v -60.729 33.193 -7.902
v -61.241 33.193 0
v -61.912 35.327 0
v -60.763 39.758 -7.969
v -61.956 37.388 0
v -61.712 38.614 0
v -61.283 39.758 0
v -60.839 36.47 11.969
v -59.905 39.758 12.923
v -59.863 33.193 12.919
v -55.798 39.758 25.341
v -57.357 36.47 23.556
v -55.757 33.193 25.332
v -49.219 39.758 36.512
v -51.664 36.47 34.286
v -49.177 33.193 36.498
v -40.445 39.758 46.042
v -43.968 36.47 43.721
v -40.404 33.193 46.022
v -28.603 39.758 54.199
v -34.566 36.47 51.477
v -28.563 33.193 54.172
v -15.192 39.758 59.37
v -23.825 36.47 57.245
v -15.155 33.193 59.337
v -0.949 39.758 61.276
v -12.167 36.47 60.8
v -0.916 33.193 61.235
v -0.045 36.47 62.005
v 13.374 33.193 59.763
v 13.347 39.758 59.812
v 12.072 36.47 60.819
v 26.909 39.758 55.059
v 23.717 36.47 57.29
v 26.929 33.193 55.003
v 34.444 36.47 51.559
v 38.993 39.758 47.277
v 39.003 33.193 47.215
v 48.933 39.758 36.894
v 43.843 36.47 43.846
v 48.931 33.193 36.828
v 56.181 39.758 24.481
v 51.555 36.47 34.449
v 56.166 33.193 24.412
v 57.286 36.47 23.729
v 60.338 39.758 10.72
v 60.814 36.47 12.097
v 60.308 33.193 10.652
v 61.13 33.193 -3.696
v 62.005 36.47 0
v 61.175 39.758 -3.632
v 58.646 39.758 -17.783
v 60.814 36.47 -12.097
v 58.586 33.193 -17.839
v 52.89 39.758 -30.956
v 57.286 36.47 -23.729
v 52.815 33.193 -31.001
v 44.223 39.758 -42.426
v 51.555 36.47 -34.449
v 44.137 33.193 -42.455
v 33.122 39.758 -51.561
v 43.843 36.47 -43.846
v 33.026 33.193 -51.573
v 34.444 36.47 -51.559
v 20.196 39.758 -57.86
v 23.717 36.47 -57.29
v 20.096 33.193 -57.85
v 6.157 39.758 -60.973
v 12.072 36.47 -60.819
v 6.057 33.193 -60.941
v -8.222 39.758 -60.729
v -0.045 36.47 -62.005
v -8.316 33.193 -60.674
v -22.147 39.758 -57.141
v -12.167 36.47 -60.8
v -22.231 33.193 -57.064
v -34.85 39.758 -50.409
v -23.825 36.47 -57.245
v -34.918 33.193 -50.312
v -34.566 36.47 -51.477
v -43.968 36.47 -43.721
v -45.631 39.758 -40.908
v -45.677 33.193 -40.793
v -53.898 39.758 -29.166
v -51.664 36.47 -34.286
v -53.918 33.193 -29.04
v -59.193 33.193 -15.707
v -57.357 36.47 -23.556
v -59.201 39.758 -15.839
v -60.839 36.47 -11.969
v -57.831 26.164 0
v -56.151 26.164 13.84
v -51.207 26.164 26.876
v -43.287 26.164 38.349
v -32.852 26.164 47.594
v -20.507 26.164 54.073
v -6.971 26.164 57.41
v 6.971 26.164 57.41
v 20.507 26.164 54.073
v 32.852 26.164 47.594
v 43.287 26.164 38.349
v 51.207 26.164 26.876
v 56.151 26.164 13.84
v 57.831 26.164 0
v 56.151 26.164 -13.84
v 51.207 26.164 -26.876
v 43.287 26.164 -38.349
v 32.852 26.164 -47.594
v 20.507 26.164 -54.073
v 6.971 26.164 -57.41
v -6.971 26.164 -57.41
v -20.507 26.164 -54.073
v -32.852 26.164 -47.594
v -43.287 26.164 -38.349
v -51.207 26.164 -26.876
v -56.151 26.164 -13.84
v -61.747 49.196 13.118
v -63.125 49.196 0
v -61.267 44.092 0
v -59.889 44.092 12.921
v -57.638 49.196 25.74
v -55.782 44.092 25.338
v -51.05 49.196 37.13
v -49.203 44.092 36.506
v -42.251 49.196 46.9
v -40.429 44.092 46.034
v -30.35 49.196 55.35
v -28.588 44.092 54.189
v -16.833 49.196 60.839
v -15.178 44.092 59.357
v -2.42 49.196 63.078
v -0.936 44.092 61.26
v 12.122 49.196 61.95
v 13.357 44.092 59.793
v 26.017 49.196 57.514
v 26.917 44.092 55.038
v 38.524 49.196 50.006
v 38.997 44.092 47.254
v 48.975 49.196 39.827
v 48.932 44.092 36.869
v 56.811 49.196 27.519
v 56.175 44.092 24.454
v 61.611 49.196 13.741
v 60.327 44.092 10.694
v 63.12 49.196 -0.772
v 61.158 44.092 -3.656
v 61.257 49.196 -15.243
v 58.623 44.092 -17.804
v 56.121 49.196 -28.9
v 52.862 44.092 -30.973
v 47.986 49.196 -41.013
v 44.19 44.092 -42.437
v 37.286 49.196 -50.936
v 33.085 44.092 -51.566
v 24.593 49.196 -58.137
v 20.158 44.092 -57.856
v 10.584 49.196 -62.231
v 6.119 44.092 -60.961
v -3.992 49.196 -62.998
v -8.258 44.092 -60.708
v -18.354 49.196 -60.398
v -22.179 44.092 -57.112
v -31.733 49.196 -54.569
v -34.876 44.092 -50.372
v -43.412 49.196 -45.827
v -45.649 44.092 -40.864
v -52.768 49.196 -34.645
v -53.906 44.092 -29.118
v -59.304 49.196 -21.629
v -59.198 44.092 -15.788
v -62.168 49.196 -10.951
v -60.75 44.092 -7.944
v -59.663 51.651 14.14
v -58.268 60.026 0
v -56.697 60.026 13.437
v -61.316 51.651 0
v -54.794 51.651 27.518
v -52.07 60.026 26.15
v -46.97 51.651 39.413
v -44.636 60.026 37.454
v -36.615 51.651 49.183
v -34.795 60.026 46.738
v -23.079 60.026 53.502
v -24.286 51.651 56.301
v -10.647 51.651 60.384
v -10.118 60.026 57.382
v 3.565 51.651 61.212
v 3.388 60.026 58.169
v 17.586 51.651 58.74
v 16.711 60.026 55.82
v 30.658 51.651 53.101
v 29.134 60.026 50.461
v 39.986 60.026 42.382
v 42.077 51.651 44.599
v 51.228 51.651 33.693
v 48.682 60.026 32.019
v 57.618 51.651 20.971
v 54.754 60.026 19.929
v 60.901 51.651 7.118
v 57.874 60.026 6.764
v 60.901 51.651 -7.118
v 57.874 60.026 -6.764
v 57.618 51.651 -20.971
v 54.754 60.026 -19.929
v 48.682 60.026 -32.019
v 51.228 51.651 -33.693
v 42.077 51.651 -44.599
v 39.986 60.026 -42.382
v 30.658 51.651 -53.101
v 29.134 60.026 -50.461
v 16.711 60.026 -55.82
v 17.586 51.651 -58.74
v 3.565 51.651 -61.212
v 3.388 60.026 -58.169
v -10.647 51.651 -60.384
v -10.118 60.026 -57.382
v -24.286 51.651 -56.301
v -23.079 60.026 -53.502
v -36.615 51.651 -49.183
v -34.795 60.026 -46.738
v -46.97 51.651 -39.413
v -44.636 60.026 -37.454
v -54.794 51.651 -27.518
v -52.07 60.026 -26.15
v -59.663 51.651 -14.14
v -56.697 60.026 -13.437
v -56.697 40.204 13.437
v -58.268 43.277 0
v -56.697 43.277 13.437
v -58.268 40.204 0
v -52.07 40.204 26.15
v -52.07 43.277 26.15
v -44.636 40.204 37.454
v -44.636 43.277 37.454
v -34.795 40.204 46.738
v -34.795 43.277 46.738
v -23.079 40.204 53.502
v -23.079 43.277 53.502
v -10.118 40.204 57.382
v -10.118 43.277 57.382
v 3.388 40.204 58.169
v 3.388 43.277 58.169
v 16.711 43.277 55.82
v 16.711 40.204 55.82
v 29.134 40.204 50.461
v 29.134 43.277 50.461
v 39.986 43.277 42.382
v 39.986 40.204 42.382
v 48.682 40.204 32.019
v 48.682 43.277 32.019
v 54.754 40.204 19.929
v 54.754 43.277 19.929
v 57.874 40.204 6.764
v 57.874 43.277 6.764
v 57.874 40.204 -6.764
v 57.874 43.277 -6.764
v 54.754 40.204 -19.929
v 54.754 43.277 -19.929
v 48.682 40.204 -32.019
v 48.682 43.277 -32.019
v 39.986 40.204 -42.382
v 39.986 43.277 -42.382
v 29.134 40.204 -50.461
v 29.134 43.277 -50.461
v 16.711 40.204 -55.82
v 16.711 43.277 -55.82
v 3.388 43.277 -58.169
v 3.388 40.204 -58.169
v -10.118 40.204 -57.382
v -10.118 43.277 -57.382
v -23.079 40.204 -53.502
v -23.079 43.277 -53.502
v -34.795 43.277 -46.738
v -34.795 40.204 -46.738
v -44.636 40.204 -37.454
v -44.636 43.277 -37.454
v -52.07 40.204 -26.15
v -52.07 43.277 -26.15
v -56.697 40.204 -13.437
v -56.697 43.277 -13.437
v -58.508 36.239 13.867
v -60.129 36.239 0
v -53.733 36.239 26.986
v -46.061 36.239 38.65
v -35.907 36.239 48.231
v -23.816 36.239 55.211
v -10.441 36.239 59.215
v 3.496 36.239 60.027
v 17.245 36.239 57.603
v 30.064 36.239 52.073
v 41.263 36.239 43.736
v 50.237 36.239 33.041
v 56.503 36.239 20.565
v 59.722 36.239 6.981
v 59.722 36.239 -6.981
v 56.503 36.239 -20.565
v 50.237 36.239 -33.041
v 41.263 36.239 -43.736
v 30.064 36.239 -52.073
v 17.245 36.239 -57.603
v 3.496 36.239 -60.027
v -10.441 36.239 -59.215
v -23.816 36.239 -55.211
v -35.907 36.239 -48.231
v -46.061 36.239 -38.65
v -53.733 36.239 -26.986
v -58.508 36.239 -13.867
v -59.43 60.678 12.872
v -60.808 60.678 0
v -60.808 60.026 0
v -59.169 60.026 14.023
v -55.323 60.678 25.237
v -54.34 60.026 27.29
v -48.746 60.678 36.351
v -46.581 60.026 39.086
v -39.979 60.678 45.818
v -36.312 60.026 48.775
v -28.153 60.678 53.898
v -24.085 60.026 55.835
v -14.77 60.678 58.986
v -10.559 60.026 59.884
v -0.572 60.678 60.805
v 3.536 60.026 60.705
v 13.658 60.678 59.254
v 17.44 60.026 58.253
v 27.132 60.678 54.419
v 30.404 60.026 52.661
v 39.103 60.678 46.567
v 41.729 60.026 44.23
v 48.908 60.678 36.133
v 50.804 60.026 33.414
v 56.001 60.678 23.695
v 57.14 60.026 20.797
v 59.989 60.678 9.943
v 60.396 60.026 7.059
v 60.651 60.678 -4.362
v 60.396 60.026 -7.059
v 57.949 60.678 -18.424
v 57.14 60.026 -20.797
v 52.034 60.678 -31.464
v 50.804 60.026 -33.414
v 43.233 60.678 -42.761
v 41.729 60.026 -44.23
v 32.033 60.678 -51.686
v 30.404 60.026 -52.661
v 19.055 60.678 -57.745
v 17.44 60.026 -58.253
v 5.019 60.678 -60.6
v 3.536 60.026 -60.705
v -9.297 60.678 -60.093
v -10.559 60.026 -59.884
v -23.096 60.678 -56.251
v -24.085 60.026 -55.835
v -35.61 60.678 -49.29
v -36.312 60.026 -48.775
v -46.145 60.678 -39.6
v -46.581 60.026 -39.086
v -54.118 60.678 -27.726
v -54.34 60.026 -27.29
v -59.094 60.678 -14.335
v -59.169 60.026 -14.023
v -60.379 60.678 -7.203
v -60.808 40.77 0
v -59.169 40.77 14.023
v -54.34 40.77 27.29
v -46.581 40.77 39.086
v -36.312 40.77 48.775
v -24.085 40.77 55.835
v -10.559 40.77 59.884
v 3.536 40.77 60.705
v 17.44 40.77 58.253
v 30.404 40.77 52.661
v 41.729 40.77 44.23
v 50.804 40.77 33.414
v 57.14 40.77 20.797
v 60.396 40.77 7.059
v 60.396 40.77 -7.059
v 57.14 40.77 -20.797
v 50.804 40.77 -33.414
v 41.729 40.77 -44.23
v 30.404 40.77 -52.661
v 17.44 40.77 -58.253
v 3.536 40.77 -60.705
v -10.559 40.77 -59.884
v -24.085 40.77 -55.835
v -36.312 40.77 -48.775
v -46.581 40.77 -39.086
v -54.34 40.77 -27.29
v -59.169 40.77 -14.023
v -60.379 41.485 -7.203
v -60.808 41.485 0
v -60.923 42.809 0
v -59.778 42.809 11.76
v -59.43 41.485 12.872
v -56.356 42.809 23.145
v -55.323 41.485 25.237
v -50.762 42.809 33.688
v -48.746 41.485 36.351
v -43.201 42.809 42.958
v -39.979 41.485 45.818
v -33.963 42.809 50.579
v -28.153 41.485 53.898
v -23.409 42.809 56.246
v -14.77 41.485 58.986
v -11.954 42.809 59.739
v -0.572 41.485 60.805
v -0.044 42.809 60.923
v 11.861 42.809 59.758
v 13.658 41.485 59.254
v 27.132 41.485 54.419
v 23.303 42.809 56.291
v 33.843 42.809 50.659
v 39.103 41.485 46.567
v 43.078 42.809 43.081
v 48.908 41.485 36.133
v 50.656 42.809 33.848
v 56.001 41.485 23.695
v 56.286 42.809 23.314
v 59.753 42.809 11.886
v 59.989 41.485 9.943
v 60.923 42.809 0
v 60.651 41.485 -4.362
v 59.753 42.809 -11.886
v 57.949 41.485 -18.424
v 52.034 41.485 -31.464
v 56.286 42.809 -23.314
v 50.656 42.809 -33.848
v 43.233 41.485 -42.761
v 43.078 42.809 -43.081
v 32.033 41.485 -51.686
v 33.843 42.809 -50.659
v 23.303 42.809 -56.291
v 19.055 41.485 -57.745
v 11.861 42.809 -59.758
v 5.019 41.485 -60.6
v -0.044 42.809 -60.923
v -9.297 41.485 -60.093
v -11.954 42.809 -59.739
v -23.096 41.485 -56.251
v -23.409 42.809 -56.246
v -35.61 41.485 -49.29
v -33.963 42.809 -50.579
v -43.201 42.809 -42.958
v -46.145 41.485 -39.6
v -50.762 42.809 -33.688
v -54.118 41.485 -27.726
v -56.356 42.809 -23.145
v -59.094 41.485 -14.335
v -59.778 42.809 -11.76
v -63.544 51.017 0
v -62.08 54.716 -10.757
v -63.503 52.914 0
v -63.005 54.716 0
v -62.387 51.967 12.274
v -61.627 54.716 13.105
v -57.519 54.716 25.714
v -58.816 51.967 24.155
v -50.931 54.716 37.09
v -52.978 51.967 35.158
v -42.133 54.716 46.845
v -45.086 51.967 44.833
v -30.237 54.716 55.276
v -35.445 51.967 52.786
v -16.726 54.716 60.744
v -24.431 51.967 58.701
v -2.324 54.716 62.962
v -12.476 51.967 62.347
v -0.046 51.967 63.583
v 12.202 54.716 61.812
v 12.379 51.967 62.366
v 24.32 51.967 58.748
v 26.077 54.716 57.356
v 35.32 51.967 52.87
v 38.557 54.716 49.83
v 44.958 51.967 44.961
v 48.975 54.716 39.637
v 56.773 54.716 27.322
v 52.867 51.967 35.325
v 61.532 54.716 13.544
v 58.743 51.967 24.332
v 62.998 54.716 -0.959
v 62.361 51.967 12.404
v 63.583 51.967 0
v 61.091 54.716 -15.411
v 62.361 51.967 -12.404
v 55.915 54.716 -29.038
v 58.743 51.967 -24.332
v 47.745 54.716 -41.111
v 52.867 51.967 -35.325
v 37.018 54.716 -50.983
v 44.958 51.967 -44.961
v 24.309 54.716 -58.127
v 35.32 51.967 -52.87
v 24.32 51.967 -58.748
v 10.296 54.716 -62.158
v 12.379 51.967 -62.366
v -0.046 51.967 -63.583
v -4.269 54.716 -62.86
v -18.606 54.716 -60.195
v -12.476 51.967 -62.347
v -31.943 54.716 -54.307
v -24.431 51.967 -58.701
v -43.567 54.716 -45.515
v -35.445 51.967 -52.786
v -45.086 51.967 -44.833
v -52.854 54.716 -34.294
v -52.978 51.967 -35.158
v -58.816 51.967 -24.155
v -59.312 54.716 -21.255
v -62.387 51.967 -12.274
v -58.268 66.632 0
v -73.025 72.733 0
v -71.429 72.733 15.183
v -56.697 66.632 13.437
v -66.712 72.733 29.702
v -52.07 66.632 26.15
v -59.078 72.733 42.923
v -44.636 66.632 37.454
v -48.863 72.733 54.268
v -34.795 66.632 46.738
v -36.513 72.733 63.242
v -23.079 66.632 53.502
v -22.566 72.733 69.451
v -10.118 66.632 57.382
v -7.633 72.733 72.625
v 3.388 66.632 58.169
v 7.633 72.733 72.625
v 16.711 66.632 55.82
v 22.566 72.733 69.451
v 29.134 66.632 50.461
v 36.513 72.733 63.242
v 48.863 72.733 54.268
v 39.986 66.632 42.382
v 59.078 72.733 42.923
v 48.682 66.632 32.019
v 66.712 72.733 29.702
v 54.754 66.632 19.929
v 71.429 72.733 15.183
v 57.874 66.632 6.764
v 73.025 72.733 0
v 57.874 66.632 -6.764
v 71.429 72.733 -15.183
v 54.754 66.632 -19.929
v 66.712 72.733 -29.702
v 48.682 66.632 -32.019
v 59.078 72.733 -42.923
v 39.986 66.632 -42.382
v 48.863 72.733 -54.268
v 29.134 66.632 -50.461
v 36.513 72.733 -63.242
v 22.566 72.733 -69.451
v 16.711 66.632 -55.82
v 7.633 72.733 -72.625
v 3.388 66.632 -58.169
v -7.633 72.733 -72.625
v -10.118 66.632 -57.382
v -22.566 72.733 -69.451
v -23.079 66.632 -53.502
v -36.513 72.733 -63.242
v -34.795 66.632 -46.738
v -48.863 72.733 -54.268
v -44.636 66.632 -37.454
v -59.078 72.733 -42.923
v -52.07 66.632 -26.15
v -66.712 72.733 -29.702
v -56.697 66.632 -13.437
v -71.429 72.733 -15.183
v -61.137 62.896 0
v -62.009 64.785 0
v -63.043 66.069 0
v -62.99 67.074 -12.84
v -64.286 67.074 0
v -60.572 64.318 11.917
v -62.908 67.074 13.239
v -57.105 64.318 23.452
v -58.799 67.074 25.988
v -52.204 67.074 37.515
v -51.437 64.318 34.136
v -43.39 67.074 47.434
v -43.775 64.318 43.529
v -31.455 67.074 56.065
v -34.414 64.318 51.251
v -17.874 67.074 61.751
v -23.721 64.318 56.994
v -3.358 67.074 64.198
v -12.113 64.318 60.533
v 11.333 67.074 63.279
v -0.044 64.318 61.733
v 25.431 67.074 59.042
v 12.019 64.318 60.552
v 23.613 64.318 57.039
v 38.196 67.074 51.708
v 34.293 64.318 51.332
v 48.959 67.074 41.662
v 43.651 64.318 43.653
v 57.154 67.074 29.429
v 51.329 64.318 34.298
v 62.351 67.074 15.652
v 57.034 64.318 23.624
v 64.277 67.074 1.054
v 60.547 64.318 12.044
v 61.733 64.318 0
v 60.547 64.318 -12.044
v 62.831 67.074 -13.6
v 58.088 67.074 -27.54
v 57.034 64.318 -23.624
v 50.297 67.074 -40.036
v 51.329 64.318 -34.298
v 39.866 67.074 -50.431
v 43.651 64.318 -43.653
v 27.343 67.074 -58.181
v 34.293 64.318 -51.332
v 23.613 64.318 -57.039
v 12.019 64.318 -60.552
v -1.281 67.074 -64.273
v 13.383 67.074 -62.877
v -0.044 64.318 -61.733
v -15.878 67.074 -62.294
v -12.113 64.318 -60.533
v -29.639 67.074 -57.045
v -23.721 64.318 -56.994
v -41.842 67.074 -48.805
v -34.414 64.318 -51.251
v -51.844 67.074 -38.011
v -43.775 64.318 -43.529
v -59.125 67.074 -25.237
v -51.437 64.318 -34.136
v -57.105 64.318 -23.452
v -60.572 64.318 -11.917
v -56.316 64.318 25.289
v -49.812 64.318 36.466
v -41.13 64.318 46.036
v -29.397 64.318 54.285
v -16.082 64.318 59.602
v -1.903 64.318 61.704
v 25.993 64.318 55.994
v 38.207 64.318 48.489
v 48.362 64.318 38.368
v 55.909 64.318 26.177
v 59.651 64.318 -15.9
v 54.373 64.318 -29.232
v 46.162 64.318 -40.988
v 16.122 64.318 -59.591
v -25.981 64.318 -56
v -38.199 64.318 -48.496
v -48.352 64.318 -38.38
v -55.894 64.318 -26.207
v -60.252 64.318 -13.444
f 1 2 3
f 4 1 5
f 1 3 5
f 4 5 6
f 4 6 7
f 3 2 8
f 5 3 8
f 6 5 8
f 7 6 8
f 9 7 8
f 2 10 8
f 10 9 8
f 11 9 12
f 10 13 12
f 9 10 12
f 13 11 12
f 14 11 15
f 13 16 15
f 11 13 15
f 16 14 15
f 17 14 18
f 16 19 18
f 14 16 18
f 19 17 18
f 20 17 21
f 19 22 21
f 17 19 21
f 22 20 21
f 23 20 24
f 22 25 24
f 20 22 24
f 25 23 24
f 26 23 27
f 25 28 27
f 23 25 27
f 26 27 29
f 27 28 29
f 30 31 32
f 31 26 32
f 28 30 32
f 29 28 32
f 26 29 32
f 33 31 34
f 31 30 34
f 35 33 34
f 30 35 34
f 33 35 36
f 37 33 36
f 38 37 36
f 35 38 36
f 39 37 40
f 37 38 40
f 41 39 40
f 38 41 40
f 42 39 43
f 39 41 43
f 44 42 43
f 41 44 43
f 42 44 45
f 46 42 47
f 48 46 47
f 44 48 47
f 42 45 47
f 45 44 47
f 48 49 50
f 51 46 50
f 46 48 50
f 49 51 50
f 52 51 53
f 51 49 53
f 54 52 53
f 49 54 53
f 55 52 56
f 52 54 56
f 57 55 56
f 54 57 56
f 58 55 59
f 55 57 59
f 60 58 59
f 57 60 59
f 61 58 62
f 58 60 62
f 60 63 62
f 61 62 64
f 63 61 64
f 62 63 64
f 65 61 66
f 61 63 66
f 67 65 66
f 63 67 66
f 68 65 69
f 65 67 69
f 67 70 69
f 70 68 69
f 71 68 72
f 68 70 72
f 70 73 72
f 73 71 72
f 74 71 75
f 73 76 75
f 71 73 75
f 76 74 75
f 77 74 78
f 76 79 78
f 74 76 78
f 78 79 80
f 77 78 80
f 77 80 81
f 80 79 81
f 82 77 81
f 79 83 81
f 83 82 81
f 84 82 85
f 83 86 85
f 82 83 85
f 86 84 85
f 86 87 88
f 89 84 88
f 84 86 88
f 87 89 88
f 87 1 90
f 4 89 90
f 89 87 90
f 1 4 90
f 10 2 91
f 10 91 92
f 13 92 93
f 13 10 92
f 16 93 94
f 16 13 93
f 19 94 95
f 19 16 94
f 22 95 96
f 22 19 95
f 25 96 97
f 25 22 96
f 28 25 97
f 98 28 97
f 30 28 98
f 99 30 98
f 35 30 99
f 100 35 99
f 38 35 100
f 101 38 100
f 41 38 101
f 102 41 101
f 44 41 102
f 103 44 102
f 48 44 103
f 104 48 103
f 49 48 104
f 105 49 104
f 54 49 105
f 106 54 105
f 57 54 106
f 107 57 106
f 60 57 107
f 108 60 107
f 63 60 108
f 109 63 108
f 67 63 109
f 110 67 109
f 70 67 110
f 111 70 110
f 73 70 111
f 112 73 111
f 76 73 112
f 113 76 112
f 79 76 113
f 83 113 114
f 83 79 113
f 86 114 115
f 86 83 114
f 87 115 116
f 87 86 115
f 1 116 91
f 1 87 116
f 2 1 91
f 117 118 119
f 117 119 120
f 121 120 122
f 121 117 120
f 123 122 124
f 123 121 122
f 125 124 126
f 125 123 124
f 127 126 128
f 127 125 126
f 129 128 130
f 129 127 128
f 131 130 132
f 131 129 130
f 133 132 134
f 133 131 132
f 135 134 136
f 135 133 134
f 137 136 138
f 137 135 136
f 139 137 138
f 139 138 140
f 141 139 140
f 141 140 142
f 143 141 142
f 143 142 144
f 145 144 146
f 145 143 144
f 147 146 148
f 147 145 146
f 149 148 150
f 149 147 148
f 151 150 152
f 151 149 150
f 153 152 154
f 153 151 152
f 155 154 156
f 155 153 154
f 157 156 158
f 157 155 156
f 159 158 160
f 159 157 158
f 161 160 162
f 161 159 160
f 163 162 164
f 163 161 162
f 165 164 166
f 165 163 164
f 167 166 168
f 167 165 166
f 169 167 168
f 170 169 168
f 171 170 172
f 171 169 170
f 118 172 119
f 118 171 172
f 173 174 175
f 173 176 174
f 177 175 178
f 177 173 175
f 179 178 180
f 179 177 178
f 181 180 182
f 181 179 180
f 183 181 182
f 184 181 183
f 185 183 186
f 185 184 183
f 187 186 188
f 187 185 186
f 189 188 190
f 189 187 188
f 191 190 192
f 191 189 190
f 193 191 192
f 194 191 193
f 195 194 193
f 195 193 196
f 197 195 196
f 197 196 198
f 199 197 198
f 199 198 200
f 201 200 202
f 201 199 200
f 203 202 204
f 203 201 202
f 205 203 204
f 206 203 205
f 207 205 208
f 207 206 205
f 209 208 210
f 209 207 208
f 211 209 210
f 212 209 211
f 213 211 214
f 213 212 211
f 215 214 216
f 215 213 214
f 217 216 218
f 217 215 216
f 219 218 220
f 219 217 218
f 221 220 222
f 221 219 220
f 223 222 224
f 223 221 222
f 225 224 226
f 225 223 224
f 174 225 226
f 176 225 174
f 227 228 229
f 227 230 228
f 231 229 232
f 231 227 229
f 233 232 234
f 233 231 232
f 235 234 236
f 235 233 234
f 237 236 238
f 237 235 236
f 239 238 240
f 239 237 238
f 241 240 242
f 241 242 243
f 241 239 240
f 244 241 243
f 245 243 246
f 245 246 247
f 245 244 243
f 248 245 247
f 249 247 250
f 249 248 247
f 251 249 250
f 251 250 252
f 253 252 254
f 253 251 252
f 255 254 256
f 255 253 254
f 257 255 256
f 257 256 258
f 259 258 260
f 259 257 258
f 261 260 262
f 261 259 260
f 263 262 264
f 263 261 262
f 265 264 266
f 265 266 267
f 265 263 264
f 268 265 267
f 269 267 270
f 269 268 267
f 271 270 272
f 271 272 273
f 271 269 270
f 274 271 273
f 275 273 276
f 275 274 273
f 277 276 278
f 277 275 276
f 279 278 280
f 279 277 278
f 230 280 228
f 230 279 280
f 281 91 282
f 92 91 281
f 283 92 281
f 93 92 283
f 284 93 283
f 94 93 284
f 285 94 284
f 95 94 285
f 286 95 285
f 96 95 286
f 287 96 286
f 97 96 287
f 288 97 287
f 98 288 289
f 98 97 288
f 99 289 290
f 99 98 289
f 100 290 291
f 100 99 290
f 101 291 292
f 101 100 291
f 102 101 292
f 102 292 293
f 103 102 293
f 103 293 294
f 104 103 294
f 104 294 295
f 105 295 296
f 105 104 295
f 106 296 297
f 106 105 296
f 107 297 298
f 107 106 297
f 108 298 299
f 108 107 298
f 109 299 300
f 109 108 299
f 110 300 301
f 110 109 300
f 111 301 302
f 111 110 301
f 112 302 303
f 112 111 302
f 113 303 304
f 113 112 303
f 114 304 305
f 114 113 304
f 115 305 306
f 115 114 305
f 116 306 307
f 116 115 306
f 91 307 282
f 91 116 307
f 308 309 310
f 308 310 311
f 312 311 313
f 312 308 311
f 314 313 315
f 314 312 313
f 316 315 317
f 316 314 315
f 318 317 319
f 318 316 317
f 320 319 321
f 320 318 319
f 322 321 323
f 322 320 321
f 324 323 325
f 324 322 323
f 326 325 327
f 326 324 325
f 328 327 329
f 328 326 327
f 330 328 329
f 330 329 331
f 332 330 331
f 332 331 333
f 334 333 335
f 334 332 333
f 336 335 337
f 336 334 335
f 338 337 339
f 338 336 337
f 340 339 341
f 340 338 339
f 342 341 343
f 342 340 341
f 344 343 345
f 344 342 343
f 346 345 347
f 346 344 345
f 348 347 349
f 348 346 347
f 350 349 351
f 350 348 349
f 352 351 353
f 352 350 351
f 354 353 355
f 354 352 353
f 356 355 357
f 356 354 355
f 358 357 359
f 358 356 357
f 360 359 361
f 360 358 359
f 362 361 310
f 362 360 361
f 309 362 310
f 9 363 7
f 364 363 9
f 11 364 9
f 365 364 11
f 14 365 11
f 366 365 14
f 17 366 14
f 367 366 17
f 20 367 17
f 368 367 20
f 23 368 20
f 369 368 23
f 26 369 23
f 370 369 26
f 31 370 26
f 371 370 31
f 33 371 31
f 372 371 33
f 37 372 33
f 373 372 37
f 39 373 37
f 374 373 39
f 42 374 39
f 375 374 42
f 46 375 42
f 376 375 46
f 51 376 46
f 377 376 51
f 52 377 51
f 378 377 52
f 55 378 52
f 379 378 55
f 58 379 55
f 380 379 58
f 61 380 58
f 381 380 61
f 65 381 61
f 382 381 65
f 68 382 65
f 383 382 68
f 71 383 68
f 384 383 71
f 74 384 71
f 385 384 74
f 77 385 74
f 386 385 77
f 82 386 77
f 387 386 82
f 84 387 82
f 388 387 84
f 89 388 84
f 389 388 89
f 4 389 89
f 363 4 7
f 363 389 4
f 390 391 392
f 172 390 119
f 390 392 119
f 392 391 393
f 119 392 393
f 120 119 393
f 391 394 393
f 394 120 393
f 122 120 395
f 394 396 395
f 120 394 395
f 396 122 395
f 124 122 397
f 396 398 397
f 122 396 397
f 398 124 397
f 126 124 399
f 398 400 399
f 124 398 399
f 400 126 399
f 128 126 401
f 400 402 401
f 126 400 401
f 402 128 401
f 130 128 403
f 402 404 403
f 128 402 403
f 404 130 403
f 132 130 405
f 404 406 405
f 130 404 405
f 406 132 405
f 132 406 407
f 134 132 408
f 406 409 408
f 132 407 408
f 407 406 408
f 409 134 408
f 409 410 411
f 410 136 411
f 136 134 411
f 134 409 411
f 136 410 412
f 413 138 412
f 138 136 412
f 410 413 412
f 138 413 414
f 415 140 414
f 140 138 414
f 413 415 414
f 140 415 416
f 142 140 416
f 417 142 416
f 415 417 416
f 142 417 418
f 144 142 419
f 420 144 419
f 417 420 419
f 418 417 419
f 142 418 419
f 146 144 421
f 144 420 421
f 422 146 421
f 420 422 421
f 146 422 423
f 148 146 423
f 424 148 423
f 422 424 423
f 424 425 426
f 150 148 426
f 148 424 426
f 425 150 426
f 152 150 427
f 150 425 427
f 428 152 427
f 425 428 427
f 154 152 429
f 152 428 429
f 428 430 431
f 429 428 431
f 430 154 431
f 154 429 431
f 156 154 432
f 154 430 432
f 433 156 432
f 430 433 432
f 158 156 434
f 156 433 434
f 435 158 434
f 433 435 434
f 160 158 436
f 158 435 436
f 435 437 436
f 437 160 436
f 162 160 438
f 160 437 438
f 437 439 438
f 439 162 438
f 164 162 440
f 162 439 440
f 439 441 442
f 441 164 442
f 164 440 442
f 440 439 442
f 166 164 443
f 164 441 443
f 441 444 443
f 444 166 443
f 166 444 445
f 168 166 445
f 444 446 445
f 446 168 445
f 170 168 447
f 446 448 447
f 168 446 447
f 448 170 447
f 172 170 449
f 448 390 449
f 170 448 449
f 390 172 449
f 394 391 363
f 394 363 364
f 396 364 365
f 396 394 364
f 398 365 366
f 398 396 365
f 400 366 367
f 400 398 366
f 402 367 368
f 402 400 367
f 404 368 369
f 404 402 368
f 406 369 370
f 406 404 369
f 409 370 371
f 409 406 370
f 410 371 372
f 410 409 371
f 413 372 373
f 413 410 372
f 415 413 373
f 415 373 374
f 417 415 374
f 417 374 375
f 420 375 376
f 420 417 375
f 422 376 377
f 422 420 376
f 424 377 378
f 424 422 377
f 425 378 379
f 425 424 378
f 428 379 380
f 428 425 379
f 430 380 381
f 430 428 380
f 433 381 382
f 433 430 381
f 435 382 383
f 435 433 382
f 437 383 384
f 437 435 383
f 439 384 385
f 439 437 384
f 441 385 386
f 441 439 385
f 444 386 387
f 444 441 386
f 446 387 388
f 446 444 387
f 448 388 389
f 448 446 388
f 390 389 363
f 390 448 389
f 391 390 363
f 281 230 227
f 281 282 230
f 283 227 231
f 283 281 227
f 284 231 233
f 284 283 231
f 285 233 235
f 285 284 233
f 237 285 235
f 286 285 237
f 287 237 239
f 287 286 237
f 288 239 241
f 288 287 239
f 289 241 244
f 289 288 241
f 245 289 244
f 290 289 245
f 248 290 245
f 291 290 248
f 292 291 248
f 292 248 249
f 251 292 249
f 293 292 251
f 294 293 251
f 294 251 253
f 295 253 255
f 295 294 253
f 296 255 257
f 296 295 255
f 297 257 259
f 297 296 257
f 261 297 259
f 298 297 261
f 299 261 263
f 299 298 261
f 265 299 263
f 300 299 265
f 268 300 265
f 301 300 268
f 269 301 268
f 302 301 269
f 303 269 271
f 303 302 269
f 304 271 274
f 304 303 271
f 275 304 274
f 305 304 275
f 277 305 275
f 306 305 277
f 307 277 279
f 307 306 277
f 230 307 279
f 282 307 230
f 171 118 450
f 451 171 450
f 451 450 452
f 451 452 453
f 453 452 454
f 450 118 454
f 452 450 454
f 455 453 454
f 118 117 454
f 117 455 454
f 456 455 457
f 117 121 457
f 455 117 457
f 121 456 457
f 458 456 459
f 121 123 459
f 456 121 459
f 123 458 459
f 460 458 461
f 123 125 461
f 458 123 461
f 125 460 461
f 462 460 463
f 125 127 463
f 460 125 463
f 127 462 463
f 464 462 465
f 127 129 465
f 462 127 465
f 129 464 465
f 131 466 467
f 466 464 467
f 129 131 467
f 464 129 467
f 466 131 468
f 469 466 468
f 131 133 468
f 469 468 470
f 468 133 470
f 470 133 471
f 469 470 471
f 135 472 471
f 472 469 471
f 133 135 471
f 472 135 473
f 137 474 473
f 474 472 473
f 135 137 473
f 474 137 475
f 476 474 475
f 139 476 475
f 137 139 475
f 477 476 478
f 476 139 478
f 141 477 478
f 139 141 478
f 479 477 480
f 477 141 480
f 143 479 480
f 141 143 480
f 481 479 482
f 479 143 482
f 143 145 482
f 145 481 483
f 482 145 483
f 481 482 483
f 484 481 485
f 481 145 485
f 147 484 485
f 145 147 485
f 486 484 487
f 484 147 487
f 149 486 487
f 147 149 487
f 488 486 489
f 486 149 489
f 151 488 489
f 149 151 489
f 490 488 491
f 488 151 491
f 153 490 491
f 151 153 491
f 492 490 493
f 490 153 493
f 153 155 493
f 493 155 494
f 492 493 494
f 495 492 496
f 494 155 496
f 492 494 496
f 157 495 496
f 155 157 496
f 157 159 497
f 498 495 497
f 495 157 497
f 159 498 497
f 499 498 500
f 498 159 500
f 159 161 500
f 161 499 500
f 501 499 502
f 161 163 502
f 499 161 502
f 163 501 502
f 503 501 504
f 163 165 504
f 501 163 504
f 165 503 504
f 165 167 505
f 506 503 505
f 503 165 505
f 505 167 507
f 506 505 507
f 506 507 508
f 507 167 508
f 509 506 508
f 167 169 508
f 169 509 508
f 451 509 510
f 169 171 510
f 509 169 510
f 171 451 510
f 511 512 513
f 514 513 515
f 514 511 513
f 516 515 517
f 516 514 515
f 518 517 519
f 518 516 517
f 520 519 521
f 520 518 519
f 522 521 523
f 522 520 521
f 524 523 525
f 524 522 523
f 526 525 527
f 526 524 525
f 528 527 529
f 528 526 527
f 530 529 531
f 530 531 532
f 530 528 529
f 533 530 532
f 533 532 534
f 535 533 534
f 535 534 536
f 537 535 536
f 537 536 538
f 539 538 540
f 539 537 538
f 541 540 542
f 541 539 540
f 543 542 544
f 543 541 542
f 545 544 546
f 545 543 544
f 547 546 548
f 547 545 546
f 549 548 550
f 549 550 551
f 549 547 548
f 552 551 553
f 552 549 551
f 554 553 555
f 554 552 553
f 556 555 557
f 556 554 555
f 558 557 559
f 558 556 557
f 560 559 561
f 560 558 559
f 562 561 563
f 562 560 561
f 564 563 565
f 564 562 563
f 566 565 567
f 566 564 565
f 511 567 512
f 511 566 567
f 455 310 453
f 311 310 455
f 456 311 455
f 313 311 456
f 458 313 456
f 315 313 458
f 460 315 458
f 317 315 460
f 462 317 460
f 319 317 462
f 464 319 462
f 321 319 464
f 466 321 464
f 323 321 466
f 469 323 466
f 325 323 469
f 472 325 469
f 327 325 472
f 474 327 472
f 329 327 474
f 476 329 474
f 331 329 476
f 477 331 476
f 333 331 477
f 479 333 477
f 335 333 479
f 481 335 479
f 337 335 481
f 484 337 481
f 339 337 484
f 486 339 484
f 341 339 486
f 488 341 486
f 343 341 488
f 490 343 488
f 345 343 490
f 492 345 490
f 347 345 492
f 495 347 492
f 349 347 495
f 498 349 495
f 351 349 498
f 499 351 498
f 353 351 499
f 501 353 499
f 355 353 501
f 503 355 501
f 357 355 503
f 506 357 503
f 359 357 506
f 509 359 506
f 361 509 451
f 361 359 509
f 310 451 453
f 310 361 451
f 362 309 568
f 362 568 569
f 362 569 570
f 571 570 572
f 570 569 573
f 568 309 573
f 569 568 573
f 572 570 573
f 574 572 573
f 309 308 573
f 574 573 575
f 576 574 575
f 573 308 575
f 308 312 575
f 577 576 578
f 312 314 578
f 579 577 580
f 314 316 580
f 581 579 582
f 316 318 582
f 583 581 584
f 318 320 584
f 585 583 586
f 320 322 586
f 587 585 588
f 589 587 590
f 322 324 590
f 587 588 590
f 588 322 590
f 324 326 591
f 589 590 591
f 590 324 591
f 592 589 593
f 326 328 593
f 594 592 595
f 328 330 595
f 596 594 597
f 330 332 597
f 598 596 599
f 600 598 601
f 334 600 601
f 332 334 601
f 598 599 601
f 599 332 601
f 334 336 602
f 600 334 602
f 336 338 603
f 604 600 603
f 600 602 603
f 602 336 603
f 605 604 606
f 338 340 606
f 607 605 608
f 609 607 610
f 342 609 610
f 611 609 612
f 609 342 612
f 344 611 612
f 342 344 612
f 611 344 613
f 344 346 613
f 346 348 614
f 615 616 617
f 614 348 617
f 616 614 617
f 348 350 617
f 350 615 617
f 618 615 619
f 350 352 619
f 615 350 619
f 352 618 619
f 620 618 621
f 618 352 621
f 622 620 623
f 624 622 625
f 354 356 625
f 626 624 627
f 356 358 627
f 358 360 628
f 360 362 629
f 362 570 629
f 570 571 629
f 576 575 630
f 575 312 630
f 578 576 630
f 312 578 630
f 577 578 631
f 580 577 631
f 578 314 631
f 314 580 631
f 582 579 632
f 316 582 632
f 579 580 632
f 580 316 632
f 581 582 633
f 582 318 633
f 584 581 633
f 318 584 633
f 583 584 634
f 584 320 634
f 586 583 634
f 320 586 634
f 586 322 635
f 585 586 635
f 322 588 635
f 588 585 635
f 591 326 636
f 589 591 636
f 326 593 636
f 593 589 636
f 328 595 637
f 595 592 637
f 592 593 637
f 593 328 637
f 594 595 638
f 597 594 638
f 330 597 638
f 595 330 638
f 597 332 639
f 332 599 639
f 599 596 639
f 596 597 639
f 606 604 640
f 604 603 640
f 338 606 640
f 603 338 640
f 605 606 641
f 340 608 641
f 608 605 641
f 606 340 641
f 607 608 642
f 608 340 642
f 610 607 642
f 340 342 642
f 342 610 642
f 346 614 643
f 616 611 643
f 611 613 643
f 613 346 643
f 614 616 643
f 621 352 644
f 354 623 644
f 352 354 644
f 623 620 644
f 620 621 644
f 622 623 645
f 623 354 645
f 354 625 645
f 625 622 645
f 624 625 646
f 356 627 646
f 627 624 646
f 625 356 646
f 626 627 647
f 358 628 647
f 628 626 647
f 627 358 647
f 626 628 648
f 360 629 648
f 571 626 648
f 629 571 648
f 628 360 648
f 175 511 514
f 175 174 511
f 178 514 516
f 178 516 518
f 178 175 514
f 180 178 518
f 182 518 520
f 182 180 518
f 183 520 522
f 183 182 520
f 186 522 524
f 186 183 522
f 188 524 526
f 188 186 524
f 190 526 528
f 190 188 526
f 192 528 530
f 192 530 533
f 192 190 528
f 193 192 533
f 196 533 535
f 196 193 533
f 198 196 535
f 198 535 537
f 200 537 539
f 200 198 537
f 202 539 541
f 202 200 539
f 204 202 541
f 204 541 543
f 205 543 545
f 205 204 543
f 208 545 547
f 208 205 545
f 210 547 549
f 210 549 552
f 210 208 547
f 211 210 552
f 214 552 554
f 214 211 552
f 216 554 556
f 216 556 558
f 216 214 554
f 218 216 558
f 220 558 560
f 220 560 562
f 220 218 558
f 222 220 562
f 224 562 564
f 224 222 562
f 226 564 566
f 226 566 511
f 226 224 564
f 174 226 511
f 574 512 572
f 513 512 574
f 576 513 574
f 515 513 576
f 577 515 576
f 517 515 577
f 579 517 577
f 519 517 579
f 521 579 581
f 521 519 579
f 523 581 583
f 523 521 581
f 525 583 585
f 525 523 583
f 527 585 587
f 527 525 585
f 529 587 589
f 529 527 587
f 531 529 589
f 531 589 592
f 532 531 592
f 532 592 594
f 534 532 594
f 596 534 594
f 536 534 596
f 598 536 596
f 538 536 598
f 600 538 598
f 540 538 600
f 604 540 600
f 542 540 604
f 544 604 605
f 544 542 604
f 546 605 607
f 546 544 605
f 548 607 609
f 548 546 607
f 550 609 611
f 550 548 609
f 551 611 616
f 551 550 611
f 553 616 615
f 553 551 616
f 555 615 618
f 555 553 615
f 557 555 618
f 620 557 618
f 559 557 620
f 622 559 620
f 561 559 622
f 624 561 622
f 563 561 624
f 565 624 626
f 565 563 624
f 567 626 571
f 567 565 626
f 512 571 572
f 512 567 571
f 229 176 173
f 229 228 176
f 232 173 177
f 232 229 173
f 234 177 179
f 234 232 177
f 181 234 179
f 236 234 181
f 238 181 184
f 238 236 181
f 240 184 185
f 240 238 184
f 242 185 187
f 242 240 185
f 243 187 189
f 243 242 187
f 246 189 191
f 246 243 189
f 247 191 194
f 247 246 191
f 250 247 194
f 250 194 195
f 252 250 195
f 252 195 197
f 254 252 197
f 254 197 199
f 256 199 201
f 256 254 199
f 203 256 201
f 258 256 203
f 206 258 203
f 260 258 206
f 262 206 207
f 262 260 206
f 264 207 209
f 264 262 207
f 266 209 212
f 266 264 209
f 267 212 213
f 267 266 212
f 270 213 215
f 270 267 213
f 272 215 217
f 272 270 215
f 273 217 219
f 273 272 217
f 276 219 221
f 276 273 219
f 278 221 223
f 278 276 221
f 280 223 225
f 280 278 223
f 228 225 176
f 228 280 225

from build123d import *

# Parameters (mm, degrees)
FILLET1_R = 7.62


with BuildPart() as part:
    # Sketch2 → Revolve1 (revolve)
    with BuildSketch(Plane.XY):
        Polygon((-58.2676, 43.2769703), (-58.2676, 40.2035703), (-60.12897926, 36.239383837), (-57.831323448, 26.163828165), (-62.828989293, 36.465258256), (-60.8076, 40.770218692), (-60.8076, 42.829099769), (-64.137873862, 51.978952006), (-60.8076, 60.025592649), (-60.8076, 64.821818572), (-73.025, 72.733281474), (-58.2676, 66.631684467), (-58.2676, 60.025592649), (-61.3156, 51.651281474), align=None)
    revolve(axis=Axis((0, 0, 0), (0, 1, 0)))

    # Fillet1
    fillet1_edges = [part.edges().sort_by_distance(p)[0] for p in [
        (64.137873862, 51.978952006, 0),
        (60.8076, 42.829099769, 0),
        (62.828989293, 36.465258256, 0),
        (60.8076, 64.821818572, 0),
    ]]
    fillet(fillet1_edges, radius=FILLET1_R)


solid = part.part
